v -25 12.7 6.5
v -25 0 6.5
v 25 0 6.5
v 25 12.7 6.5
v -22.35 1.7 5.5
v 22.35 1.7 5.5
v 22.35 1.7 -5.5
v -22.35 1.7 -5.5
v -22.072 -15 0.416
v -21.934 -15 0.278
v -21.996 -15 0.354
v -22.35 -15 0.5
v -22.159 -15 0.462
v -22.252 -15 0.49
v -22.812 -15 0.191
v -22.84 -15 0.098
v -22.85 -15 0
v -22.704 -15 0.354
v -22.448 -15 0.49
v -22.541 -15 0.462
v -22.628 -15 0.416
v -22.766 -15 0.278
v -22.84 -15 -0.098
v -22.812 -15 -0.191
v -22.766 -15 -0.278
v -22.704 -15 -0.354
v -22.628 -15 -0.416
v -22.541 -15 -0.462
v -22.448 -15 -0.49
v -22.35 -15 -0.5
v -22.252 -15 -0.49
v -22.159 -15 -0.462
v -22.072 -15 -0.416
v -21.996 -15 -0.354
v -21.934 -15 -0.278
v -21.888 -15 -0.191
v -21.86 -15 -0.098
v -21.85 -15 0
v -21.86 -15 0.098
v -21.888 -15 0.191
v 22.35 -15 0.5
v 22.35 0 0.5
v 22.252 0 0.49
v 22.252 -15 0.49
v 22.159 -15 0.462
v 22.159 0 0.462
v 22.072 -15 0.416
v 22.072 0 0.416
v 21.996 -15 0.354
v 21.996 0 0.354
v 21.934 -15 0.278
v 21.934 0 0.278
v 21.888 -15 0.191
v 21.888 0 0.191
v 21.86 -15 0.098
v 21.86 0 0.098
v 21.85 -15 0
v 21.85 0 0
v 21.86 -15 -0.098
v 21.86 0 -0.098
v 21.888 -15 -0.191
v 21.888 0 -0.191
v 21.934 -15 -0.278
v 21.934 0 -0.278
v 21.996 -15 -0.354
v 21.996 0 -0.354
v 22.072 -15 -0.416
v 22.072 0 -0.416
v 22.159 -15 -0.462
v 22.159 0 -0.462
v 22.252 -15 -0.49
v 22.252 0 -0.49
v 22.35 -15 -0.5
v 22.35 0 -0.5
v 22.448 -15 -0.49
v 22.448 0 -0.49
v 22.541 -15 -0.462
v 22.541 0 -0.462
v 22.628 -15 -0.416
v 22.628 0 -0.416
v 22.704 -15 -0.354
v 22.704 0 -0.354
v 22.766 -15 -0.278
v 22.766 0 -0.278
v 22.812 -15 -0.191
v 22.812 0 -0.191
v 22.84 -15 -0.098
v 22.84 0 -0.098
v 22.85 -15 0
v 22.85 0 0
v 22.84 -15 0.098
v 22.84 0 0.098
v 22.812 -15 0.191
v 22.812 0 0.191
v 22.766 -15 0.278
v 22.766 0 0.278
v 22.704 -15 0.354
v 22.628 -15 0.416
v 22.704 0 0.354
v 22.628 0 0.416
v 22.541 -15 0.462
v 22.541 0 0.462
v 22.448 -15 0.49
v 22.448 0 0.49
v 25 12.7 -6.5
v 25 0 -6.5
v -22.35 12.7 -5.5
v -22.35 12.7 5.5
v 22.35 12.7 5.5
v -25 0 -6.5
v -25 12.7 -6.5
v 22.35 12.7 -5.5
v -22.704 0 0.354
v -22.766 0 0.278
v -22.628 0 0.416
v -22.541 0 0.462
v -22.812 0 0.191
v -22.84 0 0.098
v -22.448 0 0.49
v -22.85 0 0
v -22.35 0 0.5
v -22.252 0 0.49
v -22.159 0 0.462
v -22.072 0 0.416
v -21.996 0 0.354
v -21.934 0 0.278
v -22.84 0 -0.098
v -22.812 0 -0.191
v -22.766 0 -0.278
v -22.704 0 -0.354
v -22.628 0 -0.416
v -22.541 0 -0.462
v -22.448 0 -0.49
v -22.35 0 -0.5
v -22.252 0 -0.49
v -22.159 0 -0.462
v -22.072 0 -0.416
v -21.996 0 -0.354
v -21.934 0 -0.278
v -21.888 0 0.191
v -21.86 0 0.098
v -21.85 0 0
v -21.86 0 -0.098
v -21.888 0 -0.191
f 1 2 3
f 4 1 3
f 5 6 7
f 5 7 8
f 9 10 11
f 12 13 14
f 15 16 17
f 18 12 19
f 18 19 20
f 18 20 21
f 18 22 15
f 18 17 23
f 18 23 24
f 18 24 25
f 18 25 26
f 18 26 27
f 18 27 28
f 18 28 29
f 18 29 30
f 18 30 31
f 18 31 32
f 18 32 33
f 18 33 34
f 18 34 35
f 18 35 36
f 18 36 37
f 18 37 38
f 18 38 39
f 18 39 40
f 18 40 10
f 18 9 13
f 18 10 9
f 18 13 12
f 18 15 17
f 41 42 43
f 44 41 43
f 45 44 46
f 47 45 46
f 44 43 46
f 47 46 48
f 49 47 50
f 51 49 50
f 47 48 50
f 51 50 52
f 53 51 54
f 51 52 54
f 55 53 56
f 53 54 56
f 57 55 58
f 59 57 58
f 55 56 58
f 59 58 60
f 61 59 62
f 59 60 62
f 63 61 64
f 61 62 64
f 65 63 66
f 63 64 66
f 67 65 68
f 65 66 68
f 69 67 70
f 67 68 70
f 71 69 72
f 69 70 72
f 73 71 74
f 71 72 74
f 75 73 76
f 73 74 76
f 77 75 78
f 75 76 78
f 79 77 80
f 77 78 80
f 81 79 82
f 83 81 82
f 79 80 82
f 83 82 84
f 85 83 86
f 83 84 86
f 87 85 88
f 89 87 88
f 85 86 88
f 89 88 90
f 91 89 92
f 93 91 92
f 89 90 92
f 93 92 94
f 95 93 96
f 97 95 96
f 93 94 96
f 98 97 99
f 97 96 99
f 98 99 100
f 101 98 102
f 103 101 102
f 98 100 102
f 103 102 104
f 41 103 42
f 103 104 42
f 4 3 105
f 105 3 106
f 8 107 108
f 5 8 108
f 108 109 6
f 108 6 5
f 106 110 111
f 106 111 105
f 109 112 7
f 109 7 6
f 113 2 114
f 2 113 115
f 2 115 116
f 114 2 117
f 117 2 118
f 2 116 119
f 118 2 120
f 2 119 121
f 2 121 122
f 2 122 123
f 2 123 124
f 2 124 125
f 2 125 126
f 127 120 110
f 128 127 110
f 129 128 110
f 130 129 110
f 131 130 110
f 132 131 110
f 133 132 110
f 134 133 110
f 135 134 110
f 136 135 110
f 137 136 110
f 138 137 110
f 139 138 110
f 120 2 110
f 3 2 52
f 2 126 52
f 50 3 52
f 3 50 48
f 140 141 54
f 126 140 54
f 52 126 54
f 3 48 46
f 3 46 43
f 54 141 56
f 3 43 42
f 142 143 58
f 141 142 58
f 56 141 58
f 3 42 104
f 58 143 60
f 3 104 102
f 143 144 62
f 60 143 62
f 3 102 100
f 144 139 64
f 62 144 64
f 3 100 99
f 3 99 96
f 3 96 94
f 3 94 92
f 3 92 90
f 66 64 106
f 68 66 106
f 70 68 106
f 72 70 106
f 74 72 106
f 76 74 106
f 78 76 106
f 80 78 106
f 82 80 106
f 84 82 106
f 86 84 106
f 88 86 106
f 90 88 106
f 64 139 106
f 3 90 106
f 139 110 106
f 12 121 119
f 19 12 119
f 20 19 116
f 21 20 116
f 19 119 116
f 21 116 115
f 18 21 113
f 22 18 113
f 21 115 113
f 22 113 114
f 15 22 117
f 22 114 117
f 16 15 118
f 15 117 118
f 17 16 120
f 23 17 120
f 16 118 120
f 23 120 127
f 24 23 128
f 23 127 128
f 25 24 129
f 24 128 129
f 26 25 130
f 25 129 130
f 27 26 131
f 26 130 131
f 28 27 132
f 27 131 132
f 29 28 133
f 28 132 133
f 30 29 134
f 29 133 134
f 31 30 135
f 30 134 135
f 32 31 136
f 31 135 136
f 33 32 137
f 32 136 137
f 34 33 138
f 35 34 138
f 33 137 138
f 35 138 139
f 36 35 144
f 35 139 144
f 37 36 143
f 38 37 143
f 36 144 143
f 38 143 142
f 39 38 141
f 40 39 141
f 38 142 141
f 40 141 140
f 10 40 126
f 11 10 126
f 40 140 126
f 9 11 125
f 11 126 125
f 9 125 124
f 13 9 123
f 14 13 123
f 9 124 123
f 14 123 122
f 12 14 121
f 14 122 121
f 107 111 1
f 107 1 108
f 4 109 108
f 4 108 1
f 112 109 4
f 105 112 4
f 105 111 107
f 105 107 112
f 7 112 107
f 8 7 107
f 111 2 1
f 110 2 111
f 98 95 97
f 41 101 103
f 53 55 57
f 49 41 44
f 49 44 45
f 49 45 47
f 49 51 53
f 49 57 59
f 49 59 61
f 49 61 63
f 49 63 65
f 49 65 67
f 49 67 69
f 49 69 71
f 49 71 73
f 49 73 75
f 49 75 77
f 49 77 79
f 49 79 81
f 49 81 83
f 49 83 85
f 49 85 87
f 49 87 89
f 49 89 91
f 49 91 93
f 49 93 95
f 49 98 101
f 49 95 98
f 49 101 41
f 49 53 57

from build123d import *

# Parameters (mm, degrees)
SKETCH1_W          = 50
SKETCH1_H          = 13
EXTRUDE1_DEPTH     = 12.7
SKETCH2_W          = 44.7
SKETCH2_H          = 11
CUT_EXTRUDE1_DEPTH = 11
SKETCH3_R          = 0.5
EXTRUDE2_DEPTH     = 15


with BuildPart() as part:
    # Sketch1 → Extrude1 (new body)
    with BuildSketch(Plane(origin=(0, 0, 0), x_dir=(1, 0, 0), z_dir=(0, 1, 0))):
        Rectangle(SKETCH1_W, SKETCH1_H)
    extrude(amount=EXTRUDE1_DEPTH)

    # Sketch2 → Cut-Extrude1 (cut)
    with BuildSketch(Plane(origin=(0, 12.7, 0), x_dir=(-1, 0, 0), z_dir=(0, 1, 0))):
        Rectangle(SKETCH2_W, SKETCH2_H)
    extrude(amount=-CUT_EXTRUDE1_DEPTH, mode=Mode.SUBTRACT)

    # Sketch3 → Extrude2 (add)
    with BuildSketch(Plane.XZ):
        with Locations((-22.35, 0)):
            Circle(SKETCH3_R)
        with Locations((22.35, 0)):
            Circle(SKETCH3_R)
    extrude(amount=EXTRUDE2_DEPTH)


solid = part.part
